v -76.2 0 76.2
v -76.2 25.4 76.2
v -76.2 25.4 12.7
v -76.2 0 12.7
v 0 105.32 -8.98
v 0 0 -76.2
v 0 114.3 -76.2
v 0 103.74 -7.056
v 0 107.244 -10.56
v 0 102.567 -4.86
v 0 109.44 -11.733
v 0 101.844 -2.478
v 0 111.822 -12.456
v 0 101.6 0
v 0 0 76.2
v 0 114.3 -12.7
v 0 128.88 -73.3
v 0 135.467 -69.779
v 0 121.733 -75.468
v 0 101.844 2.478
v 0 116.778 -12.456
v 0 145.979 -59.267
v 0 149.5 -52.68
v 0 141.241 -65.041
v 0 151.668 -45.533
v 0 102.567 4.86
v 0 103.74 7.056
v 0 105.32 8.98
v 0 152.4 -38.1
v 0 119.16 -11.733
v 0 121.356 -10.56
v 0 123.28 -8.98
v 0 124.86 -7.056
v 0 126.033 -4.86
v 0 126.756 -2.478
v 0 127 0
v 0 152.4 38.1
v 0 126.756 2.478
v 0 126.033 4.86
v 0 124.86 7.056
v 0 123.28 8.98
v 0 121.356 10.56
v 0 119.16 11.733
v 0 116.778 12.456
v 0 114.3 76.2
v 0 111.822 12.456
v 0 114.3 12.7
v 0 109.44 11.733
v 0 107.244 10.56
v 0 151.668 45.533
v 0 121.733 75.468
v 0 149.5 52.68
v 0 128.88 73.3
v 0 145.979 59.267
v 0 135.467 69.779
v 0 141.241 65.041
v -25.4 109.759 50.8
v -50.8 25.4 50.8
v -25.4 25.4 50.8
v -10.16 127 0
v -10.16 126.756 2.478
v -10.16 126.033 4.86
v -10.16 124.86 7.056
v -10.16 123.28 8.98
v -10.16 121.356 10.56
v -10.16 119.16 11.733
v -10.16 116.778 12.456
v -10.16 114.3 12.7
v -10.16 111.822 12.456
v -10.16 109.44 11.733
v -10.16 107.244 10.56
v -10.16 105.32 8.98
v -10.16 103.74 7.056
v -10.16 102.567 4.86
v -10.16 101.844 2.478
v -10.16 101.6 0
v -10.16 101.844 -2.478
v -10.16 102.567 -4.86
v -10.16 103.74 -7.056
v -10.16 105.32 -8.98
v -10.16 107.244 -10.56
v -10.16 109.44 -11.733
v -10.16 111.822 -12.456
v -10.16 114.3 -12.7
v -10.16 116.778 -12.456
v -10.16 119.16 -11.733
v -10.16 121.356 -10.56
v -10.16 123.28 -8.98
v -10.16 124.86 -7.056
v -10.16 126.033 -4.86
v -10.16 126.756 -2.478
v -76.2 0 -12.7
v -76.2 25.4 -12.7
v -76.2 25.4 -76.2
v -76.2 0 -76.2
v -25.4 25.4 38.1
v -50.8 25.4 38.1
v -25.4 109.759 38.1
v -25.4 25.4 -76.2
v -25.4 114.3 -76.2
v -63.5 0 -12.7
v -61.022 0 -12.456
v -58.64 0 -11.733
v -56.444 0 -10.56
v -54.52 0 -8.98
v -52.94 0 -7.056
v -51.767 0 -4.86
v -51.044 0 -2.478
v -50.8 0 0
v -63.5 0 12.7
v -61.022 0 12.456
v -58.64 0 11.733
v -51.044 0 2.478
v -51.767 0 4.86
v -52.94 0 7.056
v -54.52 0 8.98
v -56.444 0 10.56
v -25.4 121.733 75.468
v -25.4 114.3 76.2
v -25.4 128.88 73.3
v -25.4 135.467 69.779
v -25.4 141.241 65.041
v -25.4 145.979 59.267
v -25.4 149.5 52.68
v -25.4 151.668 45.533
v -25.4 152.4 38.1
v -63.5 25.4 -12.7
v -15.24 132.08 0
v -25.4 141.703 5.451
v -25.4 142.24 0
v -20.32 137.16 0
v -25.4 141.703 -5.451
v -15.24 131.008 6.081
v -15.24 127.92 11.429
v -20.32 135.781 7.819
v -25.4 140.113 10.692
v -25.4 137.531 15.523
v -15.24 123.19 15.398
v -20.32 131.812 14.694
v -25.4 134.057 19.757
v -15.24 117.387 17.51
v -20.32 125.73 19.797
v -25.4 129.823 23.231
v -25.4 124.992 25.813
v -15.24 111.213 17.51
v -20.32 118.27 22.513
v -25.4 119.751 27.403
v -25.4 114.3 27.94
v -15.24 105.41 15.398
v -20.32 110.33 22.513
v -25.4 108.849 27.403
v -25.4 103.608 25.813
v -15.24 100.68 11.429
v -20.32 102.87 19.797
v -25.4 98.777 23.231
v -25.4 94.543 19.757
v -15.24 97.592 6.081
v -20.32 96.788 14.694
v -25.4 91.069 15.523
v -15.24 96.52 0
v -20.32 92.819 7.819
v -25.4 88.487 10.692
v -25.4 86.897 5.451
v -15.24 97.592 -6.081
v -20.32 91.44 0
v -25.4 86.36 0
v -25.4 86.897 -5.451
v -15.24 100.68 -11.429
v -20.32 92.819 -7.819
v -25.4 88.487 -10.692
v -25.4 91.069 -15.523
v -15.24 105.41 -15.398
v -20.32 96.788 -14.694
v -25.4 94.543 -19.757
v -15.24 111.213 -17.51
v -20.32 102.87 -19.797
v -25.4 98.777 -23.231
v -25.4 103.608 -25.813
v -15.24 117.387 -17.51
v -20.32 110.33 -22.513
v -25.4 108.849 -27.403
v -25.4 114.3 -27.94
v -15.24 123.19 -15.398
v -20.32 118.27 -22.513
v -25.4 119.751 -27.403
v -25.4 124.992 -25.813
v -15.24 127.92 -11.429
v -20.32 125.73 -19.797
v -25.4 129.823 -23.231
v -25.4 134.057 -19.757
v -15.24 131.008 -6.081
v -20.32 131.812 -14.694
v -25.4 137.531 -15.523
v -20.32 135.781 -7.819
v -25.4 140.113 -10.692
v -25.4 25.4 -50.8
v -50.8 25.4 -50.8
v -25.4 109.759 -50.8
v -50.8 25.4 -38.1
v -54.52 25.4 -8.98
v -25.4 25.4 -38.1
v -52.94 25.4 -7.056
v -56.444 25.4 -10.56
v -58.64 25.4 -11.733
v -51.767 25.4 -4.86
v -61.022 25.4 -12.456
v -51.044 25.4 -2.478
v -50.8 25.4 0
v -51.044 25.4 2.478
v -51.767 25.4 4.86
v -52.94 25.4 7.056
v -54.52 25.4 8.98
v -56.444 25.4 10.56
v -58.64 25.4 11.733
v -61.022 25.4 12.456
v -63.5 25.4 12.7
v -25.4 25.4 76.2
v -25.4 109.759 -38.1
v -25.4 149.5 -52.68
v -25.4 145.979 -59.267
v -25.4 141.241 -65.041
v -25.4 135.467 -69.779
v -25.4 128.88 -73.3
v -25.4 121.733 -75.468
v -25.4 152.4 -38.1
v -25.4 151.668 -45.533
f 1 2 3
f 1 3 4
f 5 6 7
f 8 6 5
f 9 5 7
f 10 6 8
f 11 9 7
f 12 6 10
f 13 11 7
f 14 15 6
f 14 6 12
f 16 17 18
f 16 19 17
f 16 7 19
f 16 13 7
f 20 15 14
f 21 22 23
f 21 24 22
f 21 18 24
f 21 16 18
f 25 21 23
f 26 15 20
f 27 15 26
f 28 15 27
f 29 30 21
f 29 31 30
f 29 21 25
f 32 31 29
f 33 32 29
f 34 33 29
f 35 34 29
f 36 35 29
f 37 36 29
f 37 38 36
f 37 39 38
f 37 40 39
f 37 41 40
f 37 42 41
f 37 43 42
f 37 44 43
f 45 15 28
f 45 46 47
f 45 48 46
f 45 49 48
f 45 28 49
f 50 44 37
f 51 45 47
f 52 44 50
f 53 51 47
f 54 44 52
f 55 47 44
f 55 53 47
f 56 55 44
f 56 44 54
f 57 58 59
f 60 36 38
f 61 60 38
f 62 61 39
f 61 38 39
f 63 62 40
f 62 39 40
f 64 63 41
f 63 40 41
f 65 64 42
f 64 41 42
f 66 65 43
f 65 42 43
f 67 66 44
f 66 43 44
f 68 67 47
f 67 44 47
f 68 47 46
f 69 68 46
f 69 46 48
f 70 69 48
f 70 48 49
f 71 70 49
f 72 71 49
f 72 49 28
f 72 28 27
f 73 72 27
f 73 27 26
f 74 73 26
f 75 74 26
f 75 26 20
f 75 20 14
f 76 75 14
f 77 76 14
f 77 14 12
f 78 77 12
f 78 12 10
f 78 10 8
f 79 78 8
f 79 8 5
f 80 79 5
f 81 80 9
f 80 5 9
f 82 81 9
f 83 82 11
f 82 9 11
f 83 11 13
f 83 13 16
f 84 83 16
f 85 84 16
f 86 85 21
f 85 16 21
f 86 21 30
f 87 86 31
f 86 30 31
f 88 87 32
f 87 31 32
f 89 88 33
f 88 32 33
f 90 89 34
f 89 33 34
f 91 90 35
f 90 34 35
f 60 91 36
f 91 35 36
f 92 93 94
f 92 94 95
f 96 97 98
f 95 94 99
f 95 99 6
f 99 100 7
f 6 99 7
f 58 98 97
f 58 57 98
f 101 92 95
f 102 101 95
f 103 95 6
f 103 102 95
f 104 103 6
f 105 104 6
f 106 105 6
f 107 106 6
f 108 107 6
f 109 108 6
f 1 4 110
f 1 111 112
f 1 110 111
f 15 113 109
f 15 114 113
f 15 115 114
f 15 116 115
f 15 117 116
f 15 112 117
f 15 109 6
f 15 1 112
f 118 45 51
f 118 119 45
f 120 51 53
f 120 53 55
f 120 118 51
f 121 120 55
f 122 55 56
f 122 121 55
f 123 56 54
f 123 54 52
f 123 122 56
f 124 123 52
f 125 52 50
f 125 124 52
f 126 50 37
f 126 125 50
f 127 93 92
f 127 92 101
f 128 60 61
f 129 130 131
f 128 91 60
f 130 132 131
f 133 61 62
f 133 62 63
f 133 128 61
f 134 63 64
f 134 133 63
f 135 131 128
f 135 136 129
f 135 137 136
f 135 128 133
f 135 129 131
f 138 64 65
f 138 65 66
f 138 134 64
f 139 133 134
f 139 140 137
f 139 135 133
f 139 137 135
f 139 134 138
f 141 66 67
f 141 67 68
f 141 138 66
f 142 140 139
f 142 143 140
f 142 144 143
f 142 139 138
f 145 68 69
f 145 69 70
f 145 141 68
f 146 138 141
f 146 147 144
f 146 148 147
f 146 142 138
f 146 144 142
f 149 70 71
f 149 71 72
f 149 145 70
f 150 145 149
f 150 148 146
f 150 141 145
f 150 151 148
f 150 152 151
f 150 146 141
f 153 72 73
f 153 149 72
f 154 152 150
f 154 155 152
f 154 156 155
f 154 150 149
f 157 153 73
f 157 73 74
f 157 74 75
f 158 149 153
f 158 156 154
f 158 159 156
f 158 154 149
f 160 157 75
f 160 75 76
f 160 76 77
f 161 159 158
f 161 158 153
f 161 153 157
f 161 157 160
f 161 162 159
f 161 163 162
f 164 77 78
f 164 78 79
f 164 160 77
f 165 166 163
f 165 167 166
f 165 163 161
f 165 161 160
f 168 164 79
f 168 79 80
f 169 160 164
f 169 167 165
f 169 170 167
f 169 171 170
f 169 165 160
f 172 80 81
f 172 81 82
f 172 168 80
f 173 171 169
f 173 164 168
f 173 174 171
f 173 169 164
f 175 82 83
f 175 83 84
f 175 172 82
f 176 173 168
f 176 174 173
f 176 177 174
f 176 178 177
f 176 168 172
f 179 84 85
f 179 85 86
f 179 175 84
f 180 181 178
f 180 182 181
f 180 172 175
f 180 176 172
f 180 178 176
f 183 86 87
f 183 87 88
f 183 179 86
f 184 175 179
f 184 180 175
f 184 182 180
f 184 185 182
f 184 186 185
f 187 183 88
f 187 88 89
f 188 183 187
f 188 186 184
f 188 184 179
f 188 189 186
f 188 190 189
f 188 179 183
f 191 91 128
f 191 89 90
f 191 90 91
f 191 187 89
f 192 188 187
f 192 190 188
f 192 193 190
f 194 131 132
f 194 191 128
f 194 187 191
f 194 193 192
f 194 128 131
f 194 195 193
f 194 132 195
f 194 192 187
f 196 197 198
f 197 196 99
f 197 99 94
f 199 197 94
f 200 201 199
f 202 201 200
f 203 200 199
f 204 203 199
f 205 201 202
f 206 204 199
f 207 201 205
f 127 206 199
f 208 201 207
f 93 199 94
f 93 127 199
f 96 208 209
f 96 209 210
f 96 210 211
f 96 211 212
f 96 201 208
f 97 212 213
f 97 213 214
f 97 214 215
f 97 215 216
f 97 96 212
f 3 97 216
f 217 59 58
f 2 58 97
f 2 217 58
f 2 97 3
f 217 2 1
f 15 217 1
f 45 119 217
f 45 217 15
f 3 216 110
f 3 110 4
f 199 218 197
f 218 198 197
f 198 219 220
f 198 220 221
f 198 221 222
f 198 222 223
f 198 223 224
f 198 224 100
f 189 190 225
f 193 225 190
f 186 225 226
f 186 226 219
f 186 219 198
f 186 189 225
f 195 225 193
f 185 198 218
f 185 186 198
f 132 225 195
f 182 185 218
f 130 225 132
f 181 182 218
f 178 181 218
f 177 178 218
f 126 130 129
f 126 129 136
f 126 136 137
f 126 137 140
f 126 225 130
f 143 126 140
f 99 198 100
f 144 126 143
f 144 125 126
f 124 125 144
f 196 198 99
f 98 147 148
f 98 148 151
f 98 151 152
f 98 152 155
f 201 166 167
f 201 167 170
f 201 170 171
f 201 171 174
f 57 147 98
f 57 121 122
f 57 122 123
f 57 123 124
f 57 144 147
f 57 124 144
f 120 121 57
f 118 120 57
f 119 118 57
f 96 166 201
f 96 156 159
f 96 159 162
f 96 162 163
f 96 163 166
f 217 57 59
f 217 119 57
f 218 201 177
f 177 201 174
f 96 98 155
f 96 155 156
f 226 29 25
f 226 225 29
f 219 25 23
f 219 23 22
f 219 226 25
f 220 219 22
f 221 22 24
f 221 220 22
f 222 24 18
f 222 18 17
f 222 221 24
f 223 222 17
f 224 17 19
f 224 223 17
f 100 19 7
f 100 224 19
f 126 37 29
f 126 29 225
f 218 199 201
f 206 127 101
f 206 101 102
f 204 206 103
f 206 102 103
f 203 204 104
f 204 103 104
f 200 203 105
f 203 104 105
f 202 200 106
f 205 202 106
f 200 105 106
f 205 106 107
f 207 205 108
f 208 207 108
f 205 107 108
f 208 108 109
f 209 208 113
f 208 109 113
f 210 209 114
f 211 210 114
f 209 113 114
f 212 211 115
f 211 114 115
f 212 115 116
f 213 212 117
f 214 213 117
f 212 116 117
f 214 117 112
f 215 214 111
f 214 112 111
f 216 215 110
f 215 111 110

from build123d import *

# Parameters (mm, degrees)
F1_DEPTH = 76.2
F2_R     = 12.7
F3_DEPTH = 76.201
F5_DEPTH = 25.4
F8_DEPTH = 6.35
F9_R     = 38.1
F10_R    = 38.1
F11_SIZE = 15.24


# Not quite as in the source:
# - a pattern or mirror of a feature is missing from the dataset's text; its kind, count and spacing are read off the source's solid


with BuildPart() as f1:
    # F0 (on Top) → F1 (new body, symmetric)
    with BuildSketch(Plane.XY):
        Polygon((-76.2, 25.4), (-76.2, 0), (0, 0), (0, 152.4), (-25.4, 152.4), (-25.4, 25.4), align=None)
    extrude(amount=F1_DEPTH, both=True)

    # F2 (on face) → F3 (cut, through all)
    with BuildSketch(Plane.YZ):
        with Locations((114.3, 0)):
            Circle(F2_R)
    extrude(amount=-F3_DEPTH, mode=Mode.SUBTRACT)

    # F4 (on face) → F5 (cut)
    with BuildSketch(Plane.XZ):
        with BuildLine():
            ThreePointArc((-63.5, -12.7), (-50.8, 0), (-63.5, 12.7))
            Line((-63.5, 12.7), (-76.2, 12.7))
            Line((-76.2, 12.7), (-76.2, -12.7))
            Line((-76.2, -12.7), (-63.5, -12.7))
        make_face()
    extrude(amount=-F5_DEPTH, mode=Mode.SUBTRACT)

    # F7 (on offset) → F8 (join, symmetric)
    with BuildSketch(Plane.XY.offset(44.45)):
        Polygon((-50.8, 25.4), (-25.4, 25.4), (-25.4, 109.758593142), align=None)
    f8 = extrude(amount=F8_DEPTH, both=True)

    # F8_copies: F8 across plane
    add(f8.mirror(Plane(origin=(0, 0, 0), x_dir=(-1, 0, 0), z_dir=(0, 0, -1))))

    # F9
    f9_edges = [f1.edges().sort_by_distance(p)[0] for p in [
        (-12.7, 152.4, 76.2),
    ]]
    fillet(f9_edges, radius=F9_R)

    # F10
    f10_edges = [f1.edges().sort_by_distance(p)[0] for p in [
        (-12.7, 152.4, -76.2),
    ]]
    fillet(f10_edges, radius=F10_R)

    # F11
    f11_edges = [f1.edges().sort_by_distance(p)[0] for p in [
        (-25.4, 101.6, 0),
    ]]
    chamfer(f11_edges, length=F11_SIZE)


solid = f1.part
